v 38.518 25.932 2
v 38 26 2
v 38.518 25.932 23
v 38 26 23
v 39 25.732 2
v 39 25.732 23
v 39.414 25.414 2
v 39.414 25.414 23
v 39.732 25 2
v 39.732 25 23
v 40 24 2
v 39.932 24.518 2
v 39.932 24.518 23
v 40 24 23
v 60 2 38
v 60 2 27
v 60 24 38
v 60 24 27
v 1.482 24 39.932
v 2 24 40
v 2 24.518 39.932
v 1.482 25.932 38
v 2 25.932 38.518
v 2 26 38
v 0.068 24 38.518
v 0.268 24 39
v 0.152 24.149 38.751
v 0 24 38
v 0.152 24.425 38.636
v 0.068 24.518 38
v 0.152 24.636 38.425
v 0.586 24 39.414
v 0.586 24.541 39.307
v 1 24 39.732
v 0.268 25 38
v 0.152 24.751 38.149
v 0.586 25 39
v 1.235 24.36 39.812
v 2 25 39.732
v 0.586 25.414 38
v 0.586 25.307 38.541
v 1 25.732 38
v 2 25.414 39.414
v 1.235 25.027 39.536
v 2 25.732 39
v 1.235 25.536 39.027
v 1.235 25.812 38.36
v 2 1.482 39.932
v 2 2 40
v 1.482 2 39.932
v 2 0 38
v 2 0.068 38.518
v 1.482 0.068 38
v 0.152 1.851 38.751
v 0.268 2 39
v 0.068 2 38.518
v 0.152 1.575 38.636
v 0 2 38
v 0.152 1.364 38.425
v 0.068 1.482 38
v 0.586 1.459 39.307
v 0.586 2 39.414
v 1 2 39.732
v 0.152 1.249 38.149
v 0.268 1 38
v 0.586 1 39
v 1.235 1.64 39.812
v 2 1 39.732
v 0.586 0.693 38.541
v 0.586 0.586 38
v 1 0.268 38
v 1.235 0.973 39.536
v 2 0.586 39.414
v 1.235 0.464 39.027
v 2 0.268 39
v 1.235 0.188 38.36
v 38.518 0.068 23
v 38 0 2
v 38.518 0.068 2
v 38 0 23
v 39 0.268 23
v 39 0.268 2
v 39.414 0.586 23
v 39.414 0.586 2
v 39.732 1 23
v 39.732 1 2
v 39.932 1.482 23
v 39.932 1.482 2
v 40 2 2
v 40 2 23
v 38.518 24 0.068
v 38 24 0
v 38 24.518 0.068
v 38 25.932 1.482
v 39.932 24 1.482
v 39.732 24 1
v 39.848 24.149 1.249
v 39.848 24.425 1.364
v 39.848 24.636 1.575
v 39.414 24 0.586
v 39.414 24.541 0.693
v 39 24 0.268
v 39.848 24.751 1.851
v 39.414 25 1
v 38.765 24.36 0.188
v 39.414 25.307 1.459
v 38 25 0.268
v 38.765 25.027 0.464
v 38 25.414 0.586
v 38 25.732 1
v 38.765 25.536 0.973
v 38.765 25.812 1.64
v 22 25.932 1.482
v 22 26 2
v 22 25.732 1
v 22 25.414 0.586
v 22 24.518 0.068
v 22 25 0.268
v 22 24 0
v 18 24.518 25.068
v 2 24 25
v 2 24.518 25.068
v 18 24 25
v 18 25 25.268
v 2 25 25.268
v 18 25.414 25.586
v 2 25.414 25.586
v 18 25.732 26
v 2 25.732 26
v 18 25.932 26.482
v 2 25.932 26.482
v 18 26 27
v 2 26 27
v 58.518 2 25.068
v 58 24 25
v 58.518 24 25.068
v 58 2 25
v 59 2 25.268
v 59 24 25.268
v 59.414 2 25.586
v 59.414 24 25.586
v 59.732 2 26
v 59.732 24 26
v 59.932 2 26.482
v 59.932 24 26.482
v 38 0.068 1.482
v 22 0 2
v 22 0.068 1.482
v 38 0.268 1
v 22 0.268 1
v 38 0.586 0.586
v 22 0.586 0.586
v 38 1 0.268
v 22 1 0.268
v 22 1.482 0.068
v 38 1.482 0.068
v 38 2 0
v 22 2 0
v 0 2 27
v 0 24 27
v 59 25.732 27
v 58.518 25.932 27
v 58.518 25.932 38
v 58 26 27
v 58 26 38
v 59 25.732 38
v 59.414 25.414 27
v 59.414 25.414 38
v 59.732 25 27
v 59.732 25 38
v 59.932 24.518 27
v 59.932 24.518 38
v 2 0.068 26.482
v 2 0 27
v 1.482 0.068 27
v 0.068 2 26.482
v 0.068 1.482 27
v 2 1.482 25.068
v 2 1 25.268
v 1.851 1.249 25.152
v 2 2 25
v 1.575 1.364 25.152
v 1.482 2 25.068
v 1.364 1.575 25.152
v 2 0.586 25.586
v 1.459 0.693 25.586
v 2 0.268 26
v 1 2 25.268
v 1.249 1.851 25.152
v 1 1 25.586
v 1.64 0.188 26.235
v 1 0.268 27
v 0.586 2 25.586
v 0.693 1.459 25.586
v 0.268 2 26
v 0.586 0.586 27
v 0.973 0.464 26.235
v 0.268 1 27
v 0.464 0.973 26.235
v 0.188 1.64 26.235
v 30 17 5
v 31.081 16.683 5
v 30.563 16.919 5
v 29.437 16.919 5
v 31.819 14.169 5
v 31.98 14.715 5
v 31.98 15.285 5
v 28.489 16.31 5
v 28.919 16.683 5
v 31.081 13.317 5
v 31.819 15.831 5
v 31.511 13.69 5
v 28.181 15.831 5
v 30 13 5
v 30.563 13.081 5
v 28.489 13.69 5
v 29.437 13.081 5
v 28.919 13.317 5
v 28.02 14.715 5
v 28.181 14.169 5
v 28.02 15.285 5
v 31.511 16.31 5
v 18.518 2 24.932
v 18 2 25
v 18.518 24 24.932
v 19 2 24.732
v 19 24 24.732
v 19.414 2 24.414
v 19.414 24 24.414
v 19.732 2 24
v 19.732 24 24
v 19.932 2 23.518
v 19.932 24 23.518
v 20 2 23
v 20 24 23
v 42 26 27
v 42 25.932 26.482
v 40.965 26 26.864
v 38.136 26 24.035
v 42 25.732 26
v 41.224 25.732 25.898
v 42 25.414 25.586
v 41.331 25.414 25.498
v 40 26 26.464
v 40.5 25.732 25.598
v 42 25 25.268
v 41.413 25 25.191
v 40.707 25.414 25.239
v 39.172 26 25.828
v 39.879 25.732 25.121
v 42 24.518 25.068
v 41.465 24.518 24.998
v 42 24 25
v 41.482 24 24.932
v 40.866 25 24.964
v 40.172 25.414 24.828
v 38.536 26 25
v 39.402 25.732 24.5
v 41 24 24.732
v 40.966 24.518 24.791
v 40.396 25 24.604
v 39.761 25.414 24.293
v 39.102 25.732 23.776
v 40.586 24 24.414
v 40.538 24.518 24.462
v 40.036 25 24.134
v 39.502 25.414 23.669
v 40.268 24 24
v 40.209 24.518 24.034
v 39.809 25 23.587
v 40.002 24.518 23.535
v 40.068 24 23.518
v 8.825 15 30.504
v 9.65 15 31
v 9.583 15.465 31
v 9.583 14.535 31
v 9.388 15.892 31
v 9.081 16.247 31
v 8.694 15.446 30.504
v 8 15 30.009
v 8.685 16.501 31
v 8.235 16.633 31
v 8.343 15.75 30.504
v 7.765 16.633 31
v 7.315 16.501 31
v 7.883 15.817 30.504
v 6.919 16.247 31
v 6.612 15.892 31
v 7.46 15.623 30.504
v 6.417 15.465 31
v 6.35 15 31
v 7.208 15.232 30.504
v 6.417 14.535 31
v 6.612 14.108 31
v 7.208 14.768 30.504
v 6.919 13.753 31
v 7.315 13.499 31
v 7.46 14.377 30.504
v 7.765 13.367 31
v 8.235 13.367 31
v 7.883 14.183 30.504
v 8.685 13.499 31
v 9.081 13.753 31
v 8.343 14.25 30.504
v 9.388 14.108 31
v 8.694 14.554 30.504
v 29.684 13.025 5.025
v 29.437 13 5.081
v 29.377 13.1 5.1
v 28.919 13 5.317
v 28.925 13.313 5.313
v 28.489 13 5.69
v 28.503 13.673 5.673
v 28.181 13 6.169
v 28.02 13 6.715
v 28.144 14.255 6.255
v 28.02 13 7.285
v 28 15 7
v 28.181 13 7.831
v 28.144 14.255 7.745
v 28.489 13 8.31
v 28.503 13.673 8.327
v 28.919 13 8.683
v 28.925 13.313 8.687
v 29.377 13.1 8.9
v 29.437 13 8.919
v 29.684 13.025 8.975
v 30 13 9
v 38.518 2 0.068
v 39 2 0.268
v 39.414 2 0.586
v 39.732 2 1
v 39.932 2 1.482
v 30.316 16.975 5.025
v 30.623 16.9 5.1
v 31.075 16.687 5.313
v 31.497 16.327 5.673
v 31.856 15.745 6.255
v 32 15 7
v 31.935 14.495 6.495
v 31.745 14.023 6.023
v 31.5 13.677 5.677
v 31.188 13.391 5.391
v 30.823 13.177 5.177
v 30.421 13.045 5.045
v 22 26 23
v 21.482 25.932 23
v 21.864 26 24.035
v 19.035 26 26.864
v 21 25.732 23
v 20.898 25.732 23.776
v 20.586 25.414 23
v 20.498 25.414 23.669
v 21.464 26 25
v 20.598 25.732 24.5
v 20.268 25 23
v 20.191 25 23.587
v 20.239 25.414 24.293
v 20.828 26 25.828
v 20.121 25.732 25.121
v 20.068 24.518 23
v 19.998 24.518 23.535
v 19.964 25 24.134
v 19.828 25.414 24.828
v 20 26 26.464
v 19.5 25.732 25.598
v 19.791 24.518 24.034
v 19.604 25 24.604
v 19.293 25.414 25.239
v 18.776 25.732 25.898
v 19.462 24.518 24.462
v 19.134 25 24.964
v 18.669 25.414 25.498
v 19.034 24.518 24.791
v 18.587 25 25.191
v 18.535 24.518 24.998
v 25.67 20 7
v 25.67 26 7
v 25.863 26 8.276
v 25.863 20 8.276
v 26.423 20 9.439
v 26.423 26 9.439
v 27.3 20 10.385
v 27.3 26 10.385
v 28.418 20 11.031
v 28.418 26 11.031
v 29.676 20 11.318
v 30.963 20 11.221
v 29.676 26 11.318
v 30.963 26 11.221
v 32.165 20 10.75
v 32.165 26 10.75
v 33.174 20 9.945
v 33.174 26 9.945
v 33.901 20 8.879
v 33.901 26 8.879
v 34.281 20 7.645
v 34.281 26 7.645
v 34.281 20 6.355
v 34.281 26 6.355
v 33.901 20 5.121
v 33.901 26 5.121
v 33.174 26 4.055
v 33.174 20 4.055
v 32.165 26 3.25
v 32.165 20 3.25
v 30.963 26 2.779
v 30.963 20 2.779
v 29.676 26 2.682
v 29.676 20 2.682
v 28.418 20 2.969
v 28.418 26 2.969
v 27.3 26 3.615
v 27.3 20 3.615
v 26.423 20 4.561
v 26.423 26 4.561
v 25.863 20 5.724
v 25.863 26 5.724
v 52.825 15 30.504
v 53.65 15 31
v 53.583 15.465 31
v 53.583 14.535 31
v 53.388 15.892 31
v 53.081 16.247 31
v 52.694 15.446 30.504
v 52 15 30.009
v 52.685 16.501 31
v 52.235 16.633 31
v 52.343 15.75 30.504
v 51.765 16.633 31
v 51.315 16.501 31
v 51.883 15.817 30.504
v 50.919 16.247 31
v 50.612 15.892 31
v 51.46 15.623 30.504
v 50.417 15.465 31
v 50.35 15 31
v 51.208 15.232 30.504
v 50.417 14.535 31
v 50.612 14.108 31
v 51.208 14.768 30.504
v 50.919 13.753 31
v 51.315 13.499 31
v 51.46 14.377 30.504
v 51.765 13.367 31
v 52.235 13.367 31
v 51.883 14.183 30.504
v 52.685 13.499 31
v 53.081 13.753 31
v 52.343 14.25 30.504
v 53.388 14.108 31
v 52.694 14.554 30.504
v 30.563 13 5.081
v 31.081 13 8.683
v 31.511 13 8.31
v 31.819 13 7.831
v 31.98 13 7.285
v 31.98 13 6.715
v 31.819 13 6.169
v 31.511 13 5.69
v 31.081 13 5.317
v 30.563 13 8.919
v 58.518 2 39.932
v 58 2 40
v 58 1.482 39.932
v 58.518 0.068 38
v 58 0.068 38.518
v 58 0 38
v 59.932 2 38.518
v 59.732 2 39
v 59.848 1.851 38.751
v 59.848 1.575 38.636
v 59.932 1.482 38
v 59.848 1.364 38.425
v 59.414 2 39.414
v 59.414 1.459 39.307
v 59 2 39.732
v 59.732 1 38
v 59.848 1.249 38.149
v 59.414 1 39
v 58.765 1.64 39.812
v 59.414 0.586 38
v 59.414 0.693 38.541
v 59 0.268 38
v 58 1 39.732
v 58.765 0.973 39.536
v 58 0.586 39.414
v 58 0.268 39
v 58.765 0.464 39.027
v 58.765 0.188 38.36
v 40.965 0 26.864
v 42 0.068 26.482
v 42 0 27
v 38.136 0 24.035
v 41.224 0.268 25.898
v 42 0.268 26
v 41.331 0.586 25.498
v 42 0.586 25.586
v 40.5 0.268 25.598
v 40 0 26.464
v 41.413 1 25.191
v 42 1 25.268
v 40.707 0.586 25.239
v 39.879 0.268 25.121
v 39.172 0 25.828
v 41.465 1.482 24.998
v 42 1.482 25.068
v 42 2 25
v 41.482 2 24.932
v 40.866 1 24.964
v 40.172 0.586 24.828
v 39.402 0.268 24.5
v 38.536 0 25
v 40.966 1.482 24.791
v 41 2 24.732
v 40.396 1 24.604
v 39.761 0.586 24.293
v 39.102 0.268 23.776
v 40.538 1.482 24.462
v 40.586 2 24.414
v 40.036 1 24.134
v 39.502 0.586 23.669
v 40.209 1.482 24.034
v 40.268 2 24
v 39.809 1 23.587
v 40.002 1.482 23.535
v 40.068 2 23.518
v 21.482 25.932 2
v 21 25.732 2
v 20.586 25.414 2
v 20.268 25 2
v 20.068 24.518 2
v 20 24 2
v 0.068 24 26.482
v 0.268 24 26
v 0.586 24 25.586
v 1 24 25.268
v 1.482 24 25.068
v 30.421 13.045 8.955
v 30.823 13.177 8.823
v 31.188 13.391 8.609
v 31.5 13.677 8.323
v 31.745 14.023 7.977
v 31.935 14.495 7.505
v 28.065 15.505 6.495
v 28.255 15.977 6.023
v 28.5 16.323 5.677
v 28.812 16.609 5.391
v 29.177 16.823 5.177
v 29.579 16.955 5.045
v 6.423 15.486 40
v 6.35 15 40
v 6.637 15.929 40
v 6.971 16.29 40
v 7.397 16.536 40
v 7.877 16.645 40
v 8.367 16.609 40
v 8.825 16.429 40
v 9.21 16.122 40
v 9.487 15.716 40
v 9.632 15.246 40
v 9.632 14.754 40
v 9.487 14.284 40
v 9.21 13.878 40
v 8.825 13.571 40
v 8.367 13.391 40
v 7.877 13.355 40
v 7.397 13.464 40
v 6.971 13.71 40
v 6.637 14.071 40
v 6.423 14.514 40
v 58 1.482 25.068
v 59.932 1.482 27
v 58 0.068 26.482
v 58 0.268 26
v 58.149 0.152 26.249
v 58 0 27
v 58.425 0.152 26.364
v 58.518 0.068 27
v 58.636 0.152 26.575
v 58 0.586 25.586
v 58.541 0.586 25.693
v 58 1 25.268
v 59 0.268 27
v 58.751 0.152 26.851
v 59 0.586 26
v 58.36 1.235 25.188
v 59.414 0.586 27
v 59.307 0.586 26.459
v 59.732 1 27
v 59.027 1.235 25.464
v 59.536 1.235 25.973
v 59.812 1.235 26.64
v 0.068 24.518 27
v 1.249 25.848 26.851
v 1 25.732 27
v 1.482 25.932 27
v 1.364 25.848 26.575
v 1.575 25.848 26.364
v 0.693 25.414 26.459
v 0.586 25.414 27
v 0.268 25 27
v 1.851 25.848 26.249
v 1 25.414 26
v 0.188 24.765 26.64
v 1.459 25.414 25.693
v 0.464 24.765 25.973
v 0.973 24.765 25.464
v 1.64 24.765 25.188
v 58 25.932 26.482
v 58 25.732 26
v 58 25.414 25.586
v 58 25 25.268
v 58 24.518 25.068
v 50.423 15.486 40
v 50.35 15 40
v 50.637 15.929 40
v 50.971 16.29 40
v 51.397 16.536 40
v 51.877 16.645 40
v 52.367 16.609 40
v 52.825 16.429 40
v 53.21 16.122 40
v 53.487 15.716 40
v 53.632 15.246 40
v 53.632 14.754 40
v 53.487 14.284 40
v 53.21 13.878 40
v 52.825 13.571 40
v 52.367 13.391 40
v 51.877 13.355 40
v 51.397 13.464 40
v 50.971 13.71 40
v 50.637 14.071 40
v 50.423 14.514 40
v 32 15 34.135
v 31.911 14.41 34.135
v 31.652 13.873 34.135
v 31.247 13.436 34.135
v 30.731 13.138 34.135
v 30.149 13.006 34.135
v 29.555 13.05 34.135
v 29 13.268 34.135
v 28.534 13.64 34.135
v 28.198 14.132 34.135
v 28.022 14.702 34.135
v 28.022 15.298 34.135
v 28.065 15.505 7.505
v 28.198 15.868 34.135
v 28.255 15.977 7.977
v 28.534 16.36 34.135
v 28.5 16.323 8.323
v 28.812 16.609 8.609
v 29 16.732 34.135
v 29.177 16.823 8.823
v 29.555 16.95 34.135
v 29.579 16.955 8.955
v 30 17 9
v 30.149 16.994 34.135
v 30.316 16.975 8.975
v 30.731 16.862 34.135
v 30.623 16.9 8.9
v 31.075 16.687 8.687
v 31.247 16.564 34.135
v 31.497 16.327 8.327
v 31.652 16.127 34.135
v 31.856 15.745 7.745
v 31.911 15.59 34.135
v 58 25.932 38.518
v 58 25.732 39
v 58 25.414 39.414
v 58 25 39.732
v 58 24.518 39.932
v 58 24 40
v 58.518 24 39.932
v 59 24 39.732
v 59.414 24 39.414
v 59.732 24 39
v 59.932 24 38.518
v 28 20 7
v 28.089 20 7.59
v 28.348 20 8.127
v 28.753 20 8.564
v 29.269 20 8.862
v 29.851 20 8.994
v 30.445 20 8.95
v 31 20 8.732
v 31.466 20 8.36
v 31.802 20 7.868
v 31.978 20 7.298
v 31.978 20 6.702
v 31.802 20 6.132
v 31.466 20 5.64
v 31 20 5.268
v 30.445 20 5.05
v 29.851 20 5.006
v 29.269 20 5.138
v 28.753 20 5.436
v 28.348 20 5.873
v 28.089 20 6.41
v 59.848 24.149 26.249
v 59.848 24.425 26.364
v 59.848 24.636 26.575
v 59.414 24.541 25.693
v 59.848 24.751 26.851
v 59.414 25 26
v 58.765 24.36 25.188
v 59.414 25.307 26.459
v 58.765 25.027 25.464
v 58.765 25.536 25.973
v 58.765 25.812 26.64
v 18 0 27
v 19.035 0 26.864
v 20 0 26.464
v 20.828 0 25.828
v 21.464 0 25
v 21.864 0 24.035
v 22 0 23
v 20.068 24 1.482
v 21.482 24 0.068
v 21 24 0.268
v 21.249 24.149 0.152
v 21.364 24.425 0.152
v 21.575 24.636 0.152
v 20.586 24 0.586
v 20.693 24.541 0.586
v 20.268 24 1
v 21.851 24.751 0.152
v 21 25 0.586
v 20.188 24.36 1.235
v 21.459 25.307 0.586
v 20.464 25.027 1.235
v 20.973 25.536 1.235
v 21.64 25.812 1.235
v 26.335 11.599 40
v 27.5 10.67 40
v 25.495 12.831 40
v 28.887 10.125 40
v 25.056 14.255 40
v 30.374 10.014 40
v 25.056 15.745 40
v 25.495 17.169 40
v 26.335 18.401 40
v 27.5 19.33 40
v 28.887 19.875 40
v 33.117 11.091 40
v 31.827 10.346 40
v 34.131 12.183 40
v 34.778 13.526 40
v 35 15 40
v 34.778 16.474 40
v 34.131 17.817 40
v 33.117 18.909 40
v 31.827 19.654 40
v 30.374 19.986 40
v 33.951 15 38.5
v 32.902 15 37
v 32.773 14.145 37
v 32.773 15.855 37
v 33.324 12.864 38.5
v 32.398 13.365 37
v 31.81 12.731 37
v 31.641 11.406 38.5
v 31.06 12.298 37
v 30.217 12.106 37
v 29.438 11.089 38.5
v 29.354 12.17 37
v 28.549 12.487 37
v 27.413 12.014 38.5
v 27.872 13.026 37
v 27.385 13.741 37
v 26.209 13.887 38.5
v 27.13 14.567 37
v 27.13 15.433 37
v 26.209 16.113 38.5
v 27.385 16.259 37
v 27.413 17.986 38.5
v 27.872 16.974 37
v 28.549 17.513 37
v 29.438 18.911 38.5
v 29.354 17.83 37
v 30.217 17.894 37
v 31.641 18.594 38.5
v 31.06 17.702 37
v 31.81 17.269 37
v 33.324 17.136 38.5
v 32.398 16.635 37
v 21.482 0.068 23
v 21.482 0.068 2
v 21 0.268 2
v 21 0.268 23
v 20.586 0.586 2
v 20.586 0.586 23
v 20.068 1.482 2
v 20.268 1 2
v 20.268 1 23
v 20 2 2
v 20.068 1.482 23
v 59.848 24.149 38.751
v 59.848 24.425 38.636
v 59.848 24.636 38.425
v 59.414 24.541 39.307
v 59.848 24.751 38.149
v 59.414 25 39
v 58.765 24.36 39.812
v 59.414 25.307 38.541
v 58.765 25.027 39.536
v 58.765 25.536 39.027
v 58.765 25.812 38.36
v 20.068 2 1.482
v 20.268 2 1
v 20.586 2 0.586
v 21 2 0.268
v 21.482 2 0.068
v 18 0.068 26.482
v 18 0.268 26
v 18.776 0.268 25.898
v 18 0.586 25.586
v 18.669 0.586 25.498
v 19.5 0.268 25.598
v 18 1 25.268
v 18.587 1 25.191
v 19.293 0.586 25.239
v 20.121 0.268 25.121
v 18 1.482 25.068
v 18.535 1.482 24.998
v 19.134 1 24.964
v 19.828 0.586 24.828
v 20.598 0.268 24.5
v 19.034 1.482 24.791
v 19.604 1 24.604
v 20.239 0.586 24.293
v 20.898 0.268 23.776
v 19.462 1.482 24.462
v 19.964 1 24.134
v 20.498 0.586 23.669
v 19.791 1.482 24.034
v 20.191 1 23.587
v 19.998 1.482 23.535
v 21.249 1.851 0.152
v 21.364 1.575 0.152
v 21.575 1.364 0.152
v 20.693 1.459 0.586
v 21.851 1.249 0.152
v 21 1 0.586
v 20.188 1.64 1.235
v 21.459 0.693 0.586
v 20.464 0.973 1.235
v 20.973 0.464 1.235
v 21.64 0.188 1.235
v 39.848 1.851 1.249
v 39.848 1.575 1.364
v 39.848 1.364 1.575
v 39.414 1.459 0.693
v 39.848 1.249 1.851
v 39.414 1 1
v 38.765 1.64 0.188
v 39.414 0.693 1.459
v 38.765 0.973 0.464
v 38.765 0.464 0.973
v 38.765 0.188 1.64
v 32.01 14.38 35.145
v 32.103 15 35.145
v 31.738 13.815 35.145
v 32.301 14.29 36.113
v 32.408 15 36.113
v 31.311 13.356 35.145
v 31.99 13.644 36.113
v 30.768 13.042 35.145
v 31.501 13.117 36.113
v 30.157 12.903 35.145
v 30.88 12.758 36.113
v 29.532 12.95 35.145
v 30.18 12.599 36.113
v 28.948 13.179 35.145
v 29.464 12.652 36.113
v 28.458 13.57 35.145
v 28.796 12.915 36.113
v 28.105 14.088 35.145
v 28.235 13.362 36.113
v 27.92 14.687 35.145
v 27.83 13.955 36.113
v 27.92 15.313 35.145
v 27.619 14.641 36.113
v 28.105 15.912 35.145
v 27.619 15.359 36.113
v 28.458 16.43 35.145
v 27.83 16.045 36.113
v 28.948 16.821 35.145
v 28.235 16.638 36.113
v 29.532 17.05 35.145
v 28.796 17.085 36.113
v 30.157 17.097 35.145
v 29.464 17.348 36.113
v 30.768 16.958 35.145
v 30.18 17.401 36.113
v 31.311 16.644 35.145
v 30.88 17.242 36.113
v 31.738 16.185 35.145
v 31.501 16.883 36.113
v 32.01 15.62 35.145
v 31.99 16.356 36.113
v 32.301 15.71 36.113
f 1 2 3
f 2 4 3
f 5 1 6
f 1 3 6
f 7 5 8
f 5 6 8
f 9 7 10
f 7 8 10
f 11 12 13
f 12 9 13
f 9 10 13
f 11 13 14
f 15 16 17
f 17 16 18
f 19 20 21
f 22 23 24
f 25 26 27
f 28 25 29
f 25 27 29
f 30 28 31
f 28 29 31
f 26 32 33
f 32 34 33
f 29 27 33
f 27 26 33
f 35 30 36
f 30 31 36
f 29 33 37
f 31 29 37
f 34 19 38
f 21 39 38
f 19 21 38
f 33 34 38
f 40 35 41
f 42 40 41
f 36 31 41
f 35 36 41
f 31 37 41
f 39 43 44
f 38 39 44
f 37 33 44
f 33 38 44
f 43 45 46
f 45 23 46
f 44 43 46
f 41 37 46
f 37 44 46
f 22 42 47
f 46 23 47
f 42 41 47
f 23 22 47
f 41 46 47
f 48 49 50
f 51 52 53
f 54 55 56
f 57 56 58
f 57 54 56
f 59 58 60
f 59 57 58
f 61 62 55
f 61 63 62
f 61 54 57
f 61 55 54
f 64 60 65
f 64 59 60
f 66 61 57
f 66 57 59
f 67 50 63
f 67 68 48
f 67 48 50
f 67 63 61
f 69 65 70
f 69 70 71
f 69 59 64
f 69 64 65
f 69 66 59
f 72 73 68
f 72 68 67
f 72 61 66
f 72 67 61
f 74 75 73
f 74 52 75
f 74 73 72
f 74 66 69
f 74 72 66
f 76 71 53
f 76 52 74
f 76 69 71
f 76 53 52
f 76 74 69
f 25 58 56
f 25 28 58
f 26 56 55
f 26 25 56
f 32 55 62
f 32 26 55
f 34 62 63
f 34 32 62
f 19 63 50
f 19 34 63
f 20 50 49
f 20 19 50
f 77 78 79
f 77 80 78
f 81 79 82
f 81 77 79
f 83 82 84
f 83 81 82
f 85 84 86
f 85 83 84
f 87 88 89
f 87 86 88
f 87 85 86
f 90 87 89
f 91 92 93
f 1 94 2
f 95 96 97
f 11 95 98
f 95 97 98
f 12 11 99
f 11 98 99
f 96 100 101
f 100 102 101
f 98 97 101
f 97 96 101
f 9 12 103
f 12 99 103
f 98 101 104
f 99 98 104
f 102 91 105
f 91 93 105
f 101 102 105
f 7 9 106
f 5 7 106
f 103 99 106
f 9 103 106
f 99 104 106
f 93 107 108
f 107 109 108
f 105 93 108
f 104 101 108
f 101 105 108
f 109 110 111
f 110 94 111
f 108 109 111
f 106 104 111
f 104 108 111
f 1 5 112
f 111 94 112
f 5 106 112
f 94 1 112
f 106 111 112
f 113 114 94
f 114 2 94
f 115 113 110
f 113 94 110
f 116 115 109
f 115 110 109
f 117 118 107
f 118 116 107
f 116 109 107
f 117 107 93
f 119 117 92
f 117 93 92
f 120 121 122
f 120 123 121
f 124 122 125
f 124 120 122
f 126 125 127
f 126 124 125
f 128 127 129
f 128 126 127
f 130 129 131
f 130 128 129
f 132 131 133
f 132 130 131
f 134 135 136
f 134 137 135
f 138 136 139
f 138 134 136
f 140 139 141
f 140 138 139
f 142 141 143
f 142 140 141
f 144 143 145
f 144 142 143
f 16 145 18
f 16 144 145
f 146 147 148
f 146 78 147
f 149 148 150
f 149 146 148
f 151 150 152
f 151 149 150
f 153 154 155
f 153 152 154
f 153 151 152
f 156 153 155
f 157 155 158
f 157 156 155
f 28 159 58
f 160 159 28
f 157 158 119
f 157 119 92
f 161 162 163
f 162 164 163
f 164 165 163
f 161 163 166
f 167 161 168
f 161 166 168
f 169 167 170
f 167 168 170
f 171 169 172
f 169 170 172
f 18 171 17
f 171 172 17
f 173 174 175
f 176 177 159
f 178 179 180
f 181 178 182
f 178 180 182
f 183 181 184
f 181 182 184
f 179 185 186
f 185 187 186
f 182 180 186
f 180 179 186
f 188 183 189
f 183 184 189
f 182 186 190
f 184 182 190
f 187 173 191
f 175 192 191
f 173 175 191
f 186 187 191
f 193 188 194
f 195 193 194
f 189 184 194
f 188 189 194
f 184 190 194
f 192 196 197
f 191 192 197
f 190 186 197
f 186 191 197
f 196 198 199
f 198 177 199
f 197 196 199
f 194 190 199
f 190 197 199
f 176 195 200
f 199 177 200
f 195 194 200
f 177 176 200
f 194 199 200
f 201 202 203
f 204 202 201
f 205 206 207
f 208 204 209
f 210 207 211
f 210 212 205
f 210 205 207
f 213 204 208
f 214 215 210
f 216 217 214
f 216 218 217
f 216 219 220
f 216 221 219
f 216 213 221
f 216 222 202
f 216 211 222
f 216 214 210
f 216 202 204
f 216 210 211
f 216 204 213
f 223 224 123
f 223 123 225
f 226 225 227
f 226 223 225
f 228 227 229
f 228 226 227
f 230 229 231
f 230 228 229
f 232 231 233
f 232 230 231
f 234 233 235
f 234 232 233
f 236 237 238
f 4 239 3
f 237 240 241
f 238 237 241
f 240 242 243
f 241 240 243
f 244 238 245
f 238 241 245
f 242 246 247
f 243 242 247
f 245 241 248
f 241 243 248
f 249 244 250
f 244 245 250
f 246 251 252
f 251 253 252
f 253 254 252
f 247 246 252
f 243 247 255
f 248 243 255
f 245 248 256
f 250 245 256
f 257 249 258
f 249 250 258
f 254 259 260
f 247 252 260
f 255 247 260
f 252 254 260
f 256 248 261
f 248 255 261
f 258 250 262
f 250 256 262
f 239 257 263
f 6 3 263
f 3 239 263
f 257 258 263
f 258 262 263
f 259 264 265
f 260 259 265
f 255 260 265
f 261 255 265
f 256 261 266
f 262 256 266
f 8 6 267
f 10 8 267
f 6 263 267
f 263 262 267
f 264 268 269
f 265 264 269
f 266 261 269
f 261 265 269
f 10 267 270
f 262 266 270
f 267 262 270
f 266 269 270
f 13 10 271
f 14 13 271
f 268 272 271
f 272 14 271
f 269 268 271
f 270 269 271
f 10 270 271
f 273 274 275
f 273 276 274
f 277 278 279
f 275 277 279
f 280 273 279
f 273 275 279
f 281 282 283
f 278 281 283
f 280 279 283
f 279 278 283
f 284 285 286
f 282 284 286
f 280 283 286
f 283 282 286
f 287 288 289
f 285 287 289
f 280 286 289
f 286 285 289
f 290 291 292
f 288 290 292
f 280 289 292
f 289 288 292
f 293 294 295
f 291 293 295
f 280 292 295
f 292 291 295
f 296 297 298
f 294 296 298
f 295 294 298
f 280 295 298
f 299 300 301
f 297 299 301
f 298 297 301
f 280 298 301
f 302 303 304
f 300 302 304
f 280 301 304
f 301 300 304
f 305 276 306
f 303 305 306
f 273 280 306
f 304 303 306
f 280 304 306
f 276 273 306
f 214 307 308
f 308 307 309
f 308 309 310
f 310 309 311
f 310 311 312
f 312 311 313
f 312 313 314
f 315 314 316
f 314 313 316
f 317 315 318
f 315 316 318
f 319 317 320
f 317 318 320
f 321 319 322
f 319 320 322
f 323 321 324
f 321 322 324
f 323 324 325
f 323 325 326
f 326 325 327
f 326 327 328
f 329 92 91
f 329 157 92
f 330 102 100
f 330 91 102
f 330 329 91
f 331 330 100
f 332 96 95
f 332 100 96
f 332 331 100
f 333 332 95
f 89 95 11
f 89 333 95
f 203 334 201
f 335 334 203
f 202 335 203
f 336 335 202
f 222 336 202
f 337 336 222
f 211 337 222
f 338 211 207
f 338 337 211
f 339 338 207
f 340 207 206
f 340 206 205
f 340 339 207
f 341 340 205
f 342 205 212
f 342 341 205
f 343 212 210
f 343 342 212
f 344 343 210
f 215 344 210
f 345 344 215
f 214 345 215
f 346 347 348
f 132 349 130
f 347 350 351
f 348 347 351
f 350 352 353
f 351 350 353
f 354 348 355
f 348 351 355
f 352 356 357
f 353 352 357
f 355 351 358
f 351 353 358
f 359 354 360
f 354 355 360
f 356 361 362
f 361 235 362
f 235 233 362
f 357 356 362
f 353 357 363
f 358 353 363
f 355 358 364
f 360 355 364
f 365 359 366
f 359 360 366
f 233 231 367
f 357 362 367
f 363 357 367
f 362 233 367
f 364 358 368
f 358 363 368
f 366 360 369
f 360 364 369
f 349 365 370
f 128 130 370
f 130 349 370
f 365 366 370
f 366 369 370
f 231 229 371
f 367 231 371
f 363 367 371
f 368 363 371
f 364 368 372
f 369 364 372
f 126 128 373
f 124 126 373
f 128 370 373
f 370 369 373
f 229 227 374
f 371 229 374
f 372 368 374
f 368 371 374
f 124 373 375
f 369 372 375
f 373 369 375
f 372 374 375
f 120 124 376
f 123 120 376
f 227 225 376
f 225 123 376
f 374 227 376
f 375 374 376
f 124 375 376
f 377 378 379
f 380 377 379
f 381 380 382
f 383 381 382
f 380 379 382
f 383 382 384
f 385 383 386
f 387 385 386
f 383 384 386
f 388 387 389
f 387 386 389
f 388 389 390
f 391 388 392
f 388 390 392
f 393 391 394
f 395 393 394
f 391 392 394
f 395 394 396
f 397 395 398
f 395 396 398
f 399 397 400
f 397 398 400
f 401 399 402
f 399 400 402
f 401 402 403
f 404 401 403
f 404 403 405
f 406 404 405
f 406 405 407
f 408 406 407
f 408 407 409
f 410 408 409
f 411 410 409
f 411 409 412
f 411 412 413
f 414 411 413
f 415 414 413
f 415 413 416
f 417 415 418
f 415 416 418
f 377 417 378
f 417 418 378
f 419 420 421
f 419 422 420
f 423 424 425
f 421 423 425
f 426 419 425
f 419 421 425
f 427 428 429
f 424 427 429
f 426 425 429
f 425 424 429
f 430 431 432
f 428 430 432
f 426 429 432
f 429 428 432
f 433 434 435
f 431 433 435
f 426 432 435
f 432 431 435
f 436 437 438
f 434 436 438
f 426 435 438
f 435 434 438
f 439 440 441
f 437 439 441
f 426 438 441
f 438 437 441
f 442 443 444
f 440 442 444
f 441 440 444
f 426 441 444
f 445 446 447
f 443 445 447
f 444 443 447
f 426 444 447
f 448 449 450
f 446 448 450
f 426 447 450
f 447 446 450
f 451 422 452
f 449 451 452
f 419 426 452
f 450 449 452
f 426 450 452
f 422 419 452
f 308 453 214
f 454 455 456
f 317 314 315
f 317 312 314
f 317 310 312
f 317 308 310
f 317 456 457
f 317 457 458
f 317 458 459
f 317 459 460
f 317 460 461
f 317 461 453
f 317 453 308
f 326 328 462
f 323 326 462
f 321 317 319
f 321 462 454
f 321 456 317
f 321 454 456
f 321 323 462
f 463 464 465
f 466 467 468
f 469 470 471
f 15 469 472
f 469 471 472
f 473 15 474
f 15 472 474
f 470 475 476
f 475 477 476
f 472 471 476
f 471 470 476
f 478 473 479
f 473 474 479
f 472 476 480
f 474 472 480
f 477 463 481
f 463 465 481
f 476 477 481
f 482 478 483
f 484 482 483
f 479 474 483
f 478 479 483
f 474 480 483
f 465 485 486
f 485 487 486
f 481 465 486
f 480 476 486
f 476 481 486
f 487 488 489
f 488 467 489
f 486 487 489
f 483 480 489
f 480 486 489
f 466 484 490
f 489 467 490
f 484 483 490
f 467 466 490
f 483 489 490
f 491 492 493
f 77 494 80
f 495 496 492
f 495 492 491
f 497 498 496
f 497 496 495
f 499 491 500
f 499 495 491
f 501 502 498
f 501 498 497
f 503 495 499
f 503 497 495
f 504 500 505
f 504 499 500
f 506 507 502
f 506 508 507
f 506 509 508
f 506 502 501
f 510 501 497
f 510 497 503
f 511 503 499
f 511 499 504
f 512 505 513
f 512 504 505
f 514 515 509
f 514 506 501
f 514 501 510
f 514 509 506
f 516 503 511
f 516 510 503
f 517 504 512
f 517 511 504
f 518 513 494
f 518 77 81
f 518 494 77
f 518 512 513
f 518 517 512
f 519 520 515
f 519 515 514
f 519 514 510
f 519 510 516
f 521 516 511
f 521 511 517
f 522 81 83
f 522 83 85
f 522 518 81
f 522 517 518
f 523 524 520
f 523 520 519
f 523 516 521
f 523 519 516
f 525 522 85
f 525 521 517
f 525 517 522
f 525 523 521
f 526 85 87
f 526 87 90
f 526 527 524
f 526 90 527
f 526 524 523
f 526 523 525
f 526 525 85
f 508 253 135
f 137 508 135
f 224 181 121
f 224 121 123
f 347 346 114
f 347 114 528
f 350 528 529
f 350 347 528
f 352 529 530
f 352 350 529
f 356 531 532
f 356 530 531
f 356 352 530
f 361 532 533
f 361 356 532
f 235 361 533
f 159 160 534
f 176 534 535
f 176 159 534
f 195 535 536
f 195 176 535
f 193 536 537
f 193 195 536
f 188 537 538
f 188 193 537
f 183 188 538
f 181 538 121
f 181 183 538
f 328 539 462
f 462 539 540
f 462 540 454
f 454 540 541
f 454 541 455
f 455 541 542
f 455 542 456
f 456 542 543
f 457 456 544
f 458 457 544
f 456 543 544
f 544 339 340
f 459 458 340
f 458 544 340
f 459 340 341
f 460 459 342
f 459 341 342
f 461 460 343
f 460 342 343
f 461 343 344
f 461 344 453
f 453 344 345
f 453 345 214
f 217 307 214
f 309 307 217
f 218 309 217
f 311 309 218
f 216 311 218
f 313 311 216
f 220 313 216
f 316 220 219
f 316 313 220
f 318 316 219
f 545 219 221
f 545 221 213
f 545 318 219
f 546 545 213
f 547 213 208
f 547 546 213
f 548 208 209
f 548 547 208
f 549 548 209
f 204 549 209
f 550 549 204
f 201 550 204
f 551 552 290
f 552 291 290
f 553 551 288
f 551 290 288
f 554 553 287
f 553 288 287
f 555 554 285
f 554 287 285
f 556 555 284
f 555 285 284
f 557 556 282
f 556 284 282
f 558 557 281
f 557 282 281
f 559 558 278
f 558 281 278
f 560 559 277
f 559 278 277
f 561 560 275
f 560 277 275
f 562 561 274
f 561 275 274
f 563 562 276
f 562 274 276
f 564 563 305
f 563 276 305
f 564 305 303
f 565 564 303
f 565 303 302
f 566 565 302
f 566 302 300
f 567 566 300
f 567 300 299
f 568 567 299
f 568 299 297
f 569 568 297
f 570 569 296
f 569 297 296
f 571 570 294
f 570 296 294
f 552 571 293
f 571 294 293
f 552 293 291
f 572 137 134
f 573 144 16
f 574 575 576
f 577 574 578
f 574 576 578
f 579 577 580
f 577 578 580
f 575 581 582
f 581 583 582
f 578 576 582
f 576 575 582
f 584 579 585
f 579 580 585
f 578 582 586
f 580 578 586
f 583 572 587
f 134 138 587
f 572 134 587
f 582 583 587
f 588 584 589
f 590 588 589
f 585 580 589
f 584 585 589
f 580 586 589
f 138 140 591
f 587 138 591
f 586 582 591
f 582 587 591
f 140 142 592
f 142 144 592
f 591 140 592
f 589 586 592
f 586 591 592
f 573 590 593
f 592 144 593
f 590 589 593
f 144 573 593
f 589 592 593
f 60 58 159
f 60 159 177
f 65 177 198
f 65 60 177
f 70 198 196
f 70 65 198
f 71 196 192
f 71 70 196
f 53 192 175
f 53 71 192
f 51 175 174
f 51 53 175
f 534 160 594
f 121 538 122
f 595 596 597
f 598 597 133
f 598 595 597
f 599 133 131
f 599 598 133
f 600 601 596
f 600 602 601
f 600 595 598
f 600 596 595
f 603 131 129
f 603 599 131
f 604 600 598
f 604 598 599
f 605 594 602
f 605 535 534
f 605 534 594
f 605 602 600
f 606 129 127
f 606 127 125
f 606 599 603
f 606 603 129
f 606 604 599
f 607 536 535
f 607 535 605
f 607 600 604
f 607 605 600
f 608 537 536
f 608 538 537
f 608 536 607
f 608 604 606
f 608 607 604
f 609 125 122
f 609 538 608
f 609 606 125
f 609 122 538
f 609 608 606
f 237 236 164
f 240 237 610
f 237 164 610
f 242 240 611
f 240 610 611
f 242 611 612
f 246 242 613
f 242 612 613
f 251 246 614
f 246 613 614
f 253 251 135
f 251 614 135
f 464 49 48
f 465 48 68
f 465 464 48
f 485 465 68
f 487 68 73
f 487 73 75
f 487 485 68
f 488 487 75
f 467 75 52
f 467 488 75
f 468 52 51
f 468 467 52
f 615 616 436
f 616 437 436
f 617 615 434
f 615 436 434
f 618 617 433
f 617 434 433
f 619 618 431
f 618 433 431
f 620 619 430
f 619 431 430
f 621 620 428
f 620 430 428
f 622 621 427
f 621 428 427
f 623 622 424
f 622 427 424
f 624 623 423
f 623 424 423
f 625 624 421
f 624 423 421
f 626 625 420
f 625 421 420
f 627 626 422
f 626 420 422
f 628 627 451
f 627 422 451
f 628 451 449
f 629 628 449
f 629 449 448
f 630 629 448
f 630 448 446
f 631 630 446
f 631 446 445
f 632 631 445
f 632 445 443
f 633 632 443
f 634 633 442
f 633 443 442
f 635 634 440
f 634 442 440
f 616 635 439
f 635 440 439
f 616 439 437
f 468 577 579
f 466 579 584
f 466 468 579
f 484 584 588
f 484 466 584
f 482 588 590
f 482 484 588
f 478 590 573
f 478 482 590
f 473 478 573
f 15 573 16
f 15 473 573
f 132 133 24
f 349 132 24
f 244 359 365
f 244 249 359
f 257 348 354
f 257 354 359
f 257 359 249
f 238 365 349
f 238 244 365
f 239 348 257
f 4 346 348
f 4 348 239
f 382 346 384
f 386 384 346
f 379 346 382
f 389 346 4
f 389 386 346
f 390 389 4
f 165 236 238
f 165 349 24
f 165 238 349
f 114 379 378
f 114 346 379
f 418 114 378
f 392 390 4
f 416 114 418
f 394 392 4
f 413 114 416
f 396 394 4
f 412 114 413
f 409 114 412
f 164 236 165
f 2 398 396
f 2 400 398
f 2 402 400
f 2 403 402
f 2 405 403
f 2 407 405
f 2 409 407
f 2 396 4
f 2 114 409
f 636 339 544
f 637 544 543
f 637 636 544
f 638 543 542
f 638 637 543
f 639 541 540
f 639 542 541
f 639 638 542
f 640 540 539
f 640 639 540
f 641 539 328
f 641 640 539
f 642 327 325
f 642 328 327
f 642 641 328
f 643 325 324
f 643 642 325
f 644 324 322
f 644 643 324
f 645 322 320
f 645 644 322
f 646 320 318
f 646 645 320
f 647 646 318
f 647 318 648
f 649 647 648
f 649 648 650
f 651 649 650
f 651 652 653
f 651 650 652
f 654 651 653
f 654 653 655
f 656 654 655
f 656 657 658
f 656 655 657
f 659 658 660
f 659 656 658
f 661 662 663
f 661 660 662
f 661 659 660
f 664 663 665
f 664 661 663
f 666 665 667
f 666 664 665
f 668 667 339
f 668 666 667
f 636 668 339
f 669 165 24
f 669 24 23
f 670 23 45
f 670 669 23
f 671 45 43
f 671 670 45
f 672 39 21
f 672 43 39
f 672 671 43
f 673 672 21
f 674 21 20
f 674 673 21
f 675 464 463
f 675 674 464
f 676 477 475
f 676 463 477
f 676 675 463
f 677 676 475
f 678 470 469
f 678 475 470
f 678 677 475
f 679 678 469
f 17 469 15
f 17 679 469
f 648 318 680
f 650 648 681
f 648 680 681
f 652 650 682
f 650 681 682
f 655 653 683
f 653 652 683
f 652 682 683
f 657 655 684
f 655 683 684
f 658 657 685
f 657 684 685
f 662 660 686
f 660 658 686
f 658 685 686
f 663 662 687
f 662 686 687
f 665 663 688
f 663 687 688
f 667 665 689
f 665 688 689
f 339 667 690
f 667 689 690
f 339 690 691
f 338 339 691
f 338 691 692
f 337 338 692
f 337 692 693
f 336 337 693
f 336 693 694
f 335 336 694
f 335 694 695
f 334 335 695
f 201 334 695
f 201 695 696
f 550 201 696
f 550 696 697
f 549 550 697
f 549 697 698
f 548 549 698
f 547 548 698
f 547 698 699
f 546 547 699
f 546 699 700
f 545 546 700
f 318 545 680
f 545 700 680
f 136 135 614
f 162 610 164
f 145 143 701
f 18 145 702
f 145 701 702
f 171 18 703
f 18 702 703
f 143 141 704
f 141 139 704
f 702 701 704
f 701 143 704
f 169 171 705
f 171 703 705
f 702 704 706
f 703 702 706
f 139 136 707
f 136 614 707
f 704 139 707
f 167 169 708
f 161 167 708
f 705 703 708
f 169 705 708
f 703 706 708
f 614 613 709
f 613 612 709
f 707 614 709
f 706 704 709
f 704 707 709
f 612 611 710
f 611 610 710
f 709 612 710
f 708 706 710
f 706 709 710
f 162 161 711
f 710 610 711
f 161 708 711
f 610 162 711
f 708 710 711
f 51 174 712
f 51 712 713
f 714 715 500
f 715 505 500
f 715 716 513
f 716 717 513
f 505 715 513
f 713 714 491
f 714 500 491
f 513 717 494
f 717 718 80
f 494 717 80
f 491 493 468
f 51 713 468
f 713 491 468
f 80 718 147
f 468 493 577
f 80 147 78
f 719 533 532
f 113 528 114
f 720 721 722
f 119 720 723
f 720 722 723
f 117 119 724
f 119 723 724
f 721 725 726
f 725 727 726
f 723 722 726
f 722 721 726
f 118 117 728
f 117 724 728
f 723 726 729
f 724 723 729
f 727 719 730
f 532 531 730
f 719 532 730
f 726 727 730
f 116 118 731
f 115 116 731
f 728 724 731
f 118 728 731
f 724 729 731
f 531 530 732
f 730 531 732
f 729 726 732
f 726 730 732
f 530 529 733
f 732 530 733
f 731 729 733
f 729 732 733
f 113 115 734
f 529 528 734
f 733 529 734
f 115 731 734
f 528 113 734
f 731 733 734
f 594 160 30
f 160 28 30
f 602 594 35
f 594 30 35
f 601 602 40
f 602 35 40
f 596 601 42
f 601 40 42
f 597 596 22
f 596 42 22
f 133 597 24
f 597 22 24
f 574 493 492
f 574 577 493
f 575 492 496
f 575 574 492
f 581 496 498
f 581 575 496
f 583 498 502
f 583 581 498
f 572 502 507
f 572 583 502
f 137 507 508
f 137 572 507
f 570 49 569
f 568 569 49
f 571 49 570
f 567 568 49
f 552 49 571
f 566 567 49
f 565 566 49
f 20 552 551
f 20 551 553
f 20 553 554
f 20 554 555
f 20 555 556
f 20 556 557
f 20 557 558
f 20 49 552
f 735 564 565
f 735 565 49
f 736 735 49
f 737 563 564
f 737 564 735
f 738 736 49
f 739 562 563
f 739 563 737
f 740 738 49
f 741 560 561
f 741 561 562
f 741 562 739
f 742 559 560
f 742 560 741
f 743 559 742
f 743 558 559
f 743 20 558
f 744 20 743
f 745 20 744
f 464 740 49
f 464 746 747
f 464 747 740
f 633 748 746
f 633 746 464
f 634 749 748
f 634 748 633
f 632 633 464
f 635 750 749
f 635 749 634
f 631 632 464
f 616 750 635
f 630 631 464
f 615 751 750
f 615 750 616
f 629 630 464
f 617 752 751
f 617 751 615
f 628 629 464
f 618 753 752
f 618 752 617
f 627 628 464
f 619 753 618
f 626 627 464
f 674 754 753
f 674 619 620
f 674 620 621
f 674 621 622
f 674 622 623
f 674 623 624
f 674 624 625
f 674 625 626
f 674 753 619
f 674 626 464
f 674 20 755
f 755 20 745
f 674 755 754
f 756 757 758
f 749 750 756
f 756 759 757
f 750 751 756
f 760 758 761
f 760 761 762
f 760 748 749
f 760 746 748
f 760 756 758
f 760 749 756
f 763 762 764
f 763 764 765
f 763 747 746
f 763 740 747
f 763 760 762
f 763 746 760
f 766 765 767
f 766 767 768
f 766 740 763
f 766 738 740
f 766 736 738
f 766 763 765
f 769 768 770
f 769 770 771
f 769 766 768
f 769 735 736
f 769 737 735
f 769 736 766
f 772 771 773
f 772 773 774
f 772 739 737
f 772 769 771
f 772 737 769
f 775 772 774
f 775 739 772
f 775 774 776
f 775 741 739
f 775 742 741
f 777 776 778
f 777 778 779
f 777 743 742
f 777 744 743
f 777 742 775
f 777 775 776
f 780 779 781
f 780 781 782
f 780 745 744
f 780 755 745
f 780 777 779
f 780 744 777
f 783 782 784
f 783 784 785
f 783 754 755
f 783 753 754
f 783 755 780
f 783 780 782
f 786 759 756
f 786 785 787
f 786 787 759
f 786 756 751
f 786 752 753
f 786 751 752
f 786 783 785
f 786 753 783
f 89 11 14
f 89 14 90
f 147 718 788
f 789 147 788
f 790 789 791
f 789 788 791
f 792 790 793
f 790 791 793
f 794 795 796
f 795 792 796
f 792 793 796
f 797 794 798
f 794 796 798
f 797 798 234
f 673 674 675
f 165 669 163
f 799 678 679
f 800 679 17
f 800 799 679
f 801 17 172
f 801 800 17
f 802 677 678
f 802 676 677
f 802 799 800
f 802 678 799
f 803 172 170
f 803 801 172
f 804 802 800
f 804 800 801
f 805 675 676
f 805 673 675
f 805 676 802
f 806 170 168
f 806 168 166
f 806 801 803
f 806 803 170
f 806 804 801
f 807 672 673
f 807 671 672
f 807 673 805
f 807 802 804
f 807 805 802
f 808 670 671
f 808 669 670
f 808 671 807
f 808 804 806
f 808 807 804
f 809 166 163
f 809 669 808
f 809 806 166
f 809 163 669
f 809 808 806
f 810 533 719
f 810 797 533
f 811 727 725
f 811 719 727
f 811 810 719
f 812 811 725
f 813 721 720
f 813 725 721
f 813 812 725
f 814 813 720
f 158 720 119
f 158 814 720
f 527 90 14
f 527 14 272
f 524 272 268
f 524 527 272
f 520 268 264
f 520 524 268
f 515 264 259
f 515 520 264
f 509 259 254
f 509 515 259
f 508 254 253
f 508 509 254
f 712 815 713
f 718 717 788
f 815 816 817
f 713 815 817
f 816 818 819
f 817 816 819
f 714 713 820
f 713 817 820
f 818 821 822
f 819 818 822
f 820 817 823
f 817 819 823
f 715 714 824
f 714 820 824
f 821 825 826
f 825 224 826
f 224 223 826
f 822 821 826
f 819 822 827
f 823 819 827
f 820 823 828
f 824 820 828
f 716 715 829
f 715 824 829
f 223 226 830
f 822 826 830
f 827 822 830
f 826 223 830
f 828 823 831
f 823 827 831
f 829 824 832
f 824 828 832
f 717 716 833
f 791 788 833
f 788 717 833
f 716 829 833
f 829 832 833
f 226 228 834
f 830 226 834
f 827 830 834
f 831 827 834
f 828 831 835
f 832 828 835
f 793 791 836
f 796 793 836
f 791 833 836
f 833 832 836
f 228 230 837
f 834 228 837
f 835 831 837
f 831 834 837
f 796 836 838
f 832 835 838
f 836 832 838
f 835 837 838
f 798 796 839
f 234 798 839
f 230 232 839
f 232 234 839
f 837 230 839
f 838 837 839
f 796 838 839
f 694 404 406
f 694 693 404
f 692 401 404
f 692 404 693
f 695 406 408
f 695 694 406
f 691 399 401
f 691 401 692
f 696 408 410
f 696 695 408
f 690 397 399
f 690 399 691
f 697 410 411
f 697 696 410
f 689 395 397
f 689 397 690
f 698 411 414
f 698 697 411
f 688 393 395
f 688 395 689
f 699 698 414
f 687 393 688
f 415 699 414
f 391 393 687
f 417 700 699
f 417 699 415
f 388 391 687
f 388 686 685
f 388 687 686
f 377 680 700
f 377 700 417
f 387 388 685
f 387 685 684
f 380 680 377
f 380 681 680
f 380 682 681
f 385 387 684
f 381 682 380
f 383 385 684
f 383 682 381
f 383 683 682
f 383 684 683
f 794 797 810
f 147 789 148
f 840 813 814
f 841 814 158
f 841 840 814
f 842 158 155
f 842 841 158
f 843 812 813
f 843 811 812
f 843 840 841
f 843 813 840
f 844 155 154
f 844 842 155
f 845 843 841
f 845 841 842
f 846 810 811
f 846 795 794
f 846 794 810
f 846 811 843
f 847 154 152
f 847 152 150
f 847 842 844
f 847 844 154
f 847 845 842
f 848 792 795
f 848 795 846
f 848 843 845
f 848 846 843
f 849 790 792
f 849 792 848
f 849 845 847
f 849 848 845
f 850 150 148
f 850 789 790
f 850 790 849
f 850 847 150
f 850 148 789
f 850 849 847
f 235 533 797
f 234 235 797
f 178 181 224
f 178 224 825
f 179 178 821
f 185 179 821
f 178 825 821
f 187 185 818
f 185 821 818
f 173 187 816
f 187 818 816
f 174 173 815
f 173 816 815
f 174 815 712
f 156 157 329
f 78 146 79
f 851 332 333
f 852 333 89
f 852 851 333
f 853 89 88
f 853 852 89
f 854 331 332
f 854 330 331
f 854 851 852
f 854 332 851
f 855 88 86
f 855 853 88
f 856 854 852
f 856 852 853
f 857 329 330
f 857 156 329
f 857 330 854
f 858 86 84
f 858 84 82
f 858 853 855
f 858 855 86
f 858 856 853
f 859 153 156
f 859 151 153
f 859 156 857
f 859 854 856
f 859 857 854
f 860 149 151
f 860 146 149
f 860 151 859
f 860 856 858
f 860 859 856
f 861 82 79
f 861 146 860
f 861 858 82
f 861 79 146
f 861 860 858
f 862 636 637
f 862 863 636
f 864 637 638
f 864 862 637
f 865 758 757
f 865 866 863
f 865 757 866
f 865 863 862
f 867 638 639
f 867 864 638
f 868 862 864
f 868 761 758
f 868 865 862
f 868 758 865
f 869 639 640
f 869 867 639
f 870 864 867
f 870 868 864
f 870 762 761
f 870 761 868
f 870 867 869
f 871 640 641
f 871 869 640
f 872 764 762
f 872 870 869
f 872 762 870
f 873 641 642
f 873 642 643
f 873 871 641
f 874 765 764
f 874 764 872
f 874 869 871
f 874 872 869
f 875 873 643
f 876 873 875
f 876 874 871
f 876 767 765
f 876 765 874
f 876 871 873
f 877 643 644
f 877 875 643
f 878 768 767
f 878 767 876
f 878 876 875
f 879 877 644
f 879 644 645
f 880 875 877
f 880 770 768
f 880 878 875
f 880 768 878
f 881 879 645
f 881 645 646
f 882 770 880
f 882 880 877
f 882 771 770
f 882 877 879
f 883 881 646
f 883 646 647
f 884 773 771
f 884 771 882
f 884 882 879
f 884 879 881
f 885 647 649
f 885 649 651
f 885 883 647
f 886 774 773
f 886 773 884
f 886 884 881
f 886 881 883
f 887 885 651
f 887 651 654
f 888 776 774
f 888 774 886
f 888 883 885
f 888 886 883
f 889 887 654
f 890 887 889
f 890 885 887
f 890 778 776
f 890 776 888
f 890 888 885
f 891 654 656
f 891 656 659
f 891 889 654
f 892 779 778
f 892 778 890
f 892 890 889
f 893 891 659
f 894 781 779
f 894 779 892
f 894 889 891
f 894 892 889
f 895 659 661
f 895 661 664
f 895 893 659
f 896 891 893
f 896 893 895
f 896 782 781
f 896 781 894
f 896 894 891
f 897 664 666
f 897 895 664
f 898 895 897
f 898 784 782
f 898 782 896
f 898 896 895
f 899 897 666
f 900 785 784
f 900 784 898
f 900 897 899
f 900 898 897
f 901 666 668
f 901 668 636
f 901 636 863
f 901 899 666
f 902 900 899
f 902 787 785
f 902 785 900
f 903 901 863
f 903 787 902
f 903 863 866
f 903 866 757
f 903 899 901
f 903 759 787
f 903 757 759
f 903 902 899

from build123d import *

# Parameters (mm, degrees)
F0_W      = 60
F0_H      = 26
F1_DEPTH  = 40
F5_R      = 2
F6_DEPTH  = 13
F8_D      = 3.3
F8_DEPTH  = 9
F8_TIP    = 0.9914200214
F9_R      = 4.3298566402
F10_DEPTH = 6
F11_W     = 20
F11_H     = 26
F12_DEPTH = 25
F13_R     = 2


with BuildPart() as f1:
    # F0 (on Top) → F1 (new body)
    with BuildSketch(Plane.XY):
        with Locations((30, 13)):
            Rectangle(F0_W, F0_H)
    extrude(amount=F1_DEPTH)

    # F3 (on offset) → F4 (revolve, cut)
    with BuildSketch(Plane.XZ.offset(-15)):
        with BuildLine():
            Line((35, 40), (30, 40))
            Line((30, 40), (30, 5))
            Line((30, 5), (32, 5))
            Line((32, 5), (32, 34.1348334202))
            ThreePointArc((32, 34.1348334202), (32.2309171832, 35.6367818503), (32.9023396346, 37))
            Line((32.9023396346, 37), (35, 40))
        make_face()
    revolve(axis=Axis((30, 15, 22.5), (0, 0, -1)), mode=Mode.SUBTRACT)

    # F5 (on face) → F6 (cut)
    with BuildSketch(Plane(origin=(0, 26, 0), x_dir=(-1, 0, 0), z_dir=(0, 1, 0))):
        with Locations((-30, 7)):
            Circle(F5_R)
    extrude(amount=-F6_DEPTH, mode=Mode.SUBTRACT)

    # F8
    with Locations(Plane.XY.offset(40)):
        with Locations((8, 15), (52, 15)):
            Hole(F8_D / 2, depth=F8_DEPTH)
            with Locations((0, 0, -(F8_DEPTH + F8_TIP / 2))):  # 118° drill point
                Cone(0, F8_D / 2, F8_TIP, mode=Mode.SUBTRACT)

    # F9 (on face) → F10 (cut)
    with BuildSketch(Plane(origin=(0, 26, 0), x_dir=(-1, 0, 0), z_dir=(0, 1, 0))):
        with Locations((-30, 7)):
            Circle(F9_R)
    extrude(amount=-F10_DEPTH, mode=Mode.SUBTRACT)

    # F11 (on face) → F12 (cut)
    with BuildSketch(Plane(origin=(0, 0, 0), x_dir=(1, 0, 0), z_dir=(0, 0, -1))):
        with Locations((10, -13)):
            Rectangle(F11_W, F11_H)
        with Locations((50, -13)):
            Rectangle(F11_W, F11_H)
    extrude(amount=-F12_DEPTH, mode=Mode.SUBTRACT)

    # F13
    f13_edges = [f1.edges().sort_by_distance(p)[0] for p in [
        (30, 26, 40),
        (30, 0, 40),
        (60, 13, 40),
        (0, 13, 40),
        (0, 0, 32.5),
        (10, 0, 25),
        (0, 13, 25),
        (20, 0, 12.5),
        (20, 13, 25),
        (20, 26, 12.5),
        (20, 13, 0),
        (30, 26, 0),
        (30, 0, 0),
        (40, 13, 0),
        (40, 26, 12.5),
        (40, 13, 25),
        (50, 26, 25),
        (60, 13, 25),
        (50, 0, 25),
        (40, 0, 12.5),
        (60, 26, 32.5),
        (60, 0, 32.5),
        (0, 26, 32.5),
        (10, 26, 25),
    ]]
    fillet(f13_edges, radius=F13_R)


solid = f1.part
